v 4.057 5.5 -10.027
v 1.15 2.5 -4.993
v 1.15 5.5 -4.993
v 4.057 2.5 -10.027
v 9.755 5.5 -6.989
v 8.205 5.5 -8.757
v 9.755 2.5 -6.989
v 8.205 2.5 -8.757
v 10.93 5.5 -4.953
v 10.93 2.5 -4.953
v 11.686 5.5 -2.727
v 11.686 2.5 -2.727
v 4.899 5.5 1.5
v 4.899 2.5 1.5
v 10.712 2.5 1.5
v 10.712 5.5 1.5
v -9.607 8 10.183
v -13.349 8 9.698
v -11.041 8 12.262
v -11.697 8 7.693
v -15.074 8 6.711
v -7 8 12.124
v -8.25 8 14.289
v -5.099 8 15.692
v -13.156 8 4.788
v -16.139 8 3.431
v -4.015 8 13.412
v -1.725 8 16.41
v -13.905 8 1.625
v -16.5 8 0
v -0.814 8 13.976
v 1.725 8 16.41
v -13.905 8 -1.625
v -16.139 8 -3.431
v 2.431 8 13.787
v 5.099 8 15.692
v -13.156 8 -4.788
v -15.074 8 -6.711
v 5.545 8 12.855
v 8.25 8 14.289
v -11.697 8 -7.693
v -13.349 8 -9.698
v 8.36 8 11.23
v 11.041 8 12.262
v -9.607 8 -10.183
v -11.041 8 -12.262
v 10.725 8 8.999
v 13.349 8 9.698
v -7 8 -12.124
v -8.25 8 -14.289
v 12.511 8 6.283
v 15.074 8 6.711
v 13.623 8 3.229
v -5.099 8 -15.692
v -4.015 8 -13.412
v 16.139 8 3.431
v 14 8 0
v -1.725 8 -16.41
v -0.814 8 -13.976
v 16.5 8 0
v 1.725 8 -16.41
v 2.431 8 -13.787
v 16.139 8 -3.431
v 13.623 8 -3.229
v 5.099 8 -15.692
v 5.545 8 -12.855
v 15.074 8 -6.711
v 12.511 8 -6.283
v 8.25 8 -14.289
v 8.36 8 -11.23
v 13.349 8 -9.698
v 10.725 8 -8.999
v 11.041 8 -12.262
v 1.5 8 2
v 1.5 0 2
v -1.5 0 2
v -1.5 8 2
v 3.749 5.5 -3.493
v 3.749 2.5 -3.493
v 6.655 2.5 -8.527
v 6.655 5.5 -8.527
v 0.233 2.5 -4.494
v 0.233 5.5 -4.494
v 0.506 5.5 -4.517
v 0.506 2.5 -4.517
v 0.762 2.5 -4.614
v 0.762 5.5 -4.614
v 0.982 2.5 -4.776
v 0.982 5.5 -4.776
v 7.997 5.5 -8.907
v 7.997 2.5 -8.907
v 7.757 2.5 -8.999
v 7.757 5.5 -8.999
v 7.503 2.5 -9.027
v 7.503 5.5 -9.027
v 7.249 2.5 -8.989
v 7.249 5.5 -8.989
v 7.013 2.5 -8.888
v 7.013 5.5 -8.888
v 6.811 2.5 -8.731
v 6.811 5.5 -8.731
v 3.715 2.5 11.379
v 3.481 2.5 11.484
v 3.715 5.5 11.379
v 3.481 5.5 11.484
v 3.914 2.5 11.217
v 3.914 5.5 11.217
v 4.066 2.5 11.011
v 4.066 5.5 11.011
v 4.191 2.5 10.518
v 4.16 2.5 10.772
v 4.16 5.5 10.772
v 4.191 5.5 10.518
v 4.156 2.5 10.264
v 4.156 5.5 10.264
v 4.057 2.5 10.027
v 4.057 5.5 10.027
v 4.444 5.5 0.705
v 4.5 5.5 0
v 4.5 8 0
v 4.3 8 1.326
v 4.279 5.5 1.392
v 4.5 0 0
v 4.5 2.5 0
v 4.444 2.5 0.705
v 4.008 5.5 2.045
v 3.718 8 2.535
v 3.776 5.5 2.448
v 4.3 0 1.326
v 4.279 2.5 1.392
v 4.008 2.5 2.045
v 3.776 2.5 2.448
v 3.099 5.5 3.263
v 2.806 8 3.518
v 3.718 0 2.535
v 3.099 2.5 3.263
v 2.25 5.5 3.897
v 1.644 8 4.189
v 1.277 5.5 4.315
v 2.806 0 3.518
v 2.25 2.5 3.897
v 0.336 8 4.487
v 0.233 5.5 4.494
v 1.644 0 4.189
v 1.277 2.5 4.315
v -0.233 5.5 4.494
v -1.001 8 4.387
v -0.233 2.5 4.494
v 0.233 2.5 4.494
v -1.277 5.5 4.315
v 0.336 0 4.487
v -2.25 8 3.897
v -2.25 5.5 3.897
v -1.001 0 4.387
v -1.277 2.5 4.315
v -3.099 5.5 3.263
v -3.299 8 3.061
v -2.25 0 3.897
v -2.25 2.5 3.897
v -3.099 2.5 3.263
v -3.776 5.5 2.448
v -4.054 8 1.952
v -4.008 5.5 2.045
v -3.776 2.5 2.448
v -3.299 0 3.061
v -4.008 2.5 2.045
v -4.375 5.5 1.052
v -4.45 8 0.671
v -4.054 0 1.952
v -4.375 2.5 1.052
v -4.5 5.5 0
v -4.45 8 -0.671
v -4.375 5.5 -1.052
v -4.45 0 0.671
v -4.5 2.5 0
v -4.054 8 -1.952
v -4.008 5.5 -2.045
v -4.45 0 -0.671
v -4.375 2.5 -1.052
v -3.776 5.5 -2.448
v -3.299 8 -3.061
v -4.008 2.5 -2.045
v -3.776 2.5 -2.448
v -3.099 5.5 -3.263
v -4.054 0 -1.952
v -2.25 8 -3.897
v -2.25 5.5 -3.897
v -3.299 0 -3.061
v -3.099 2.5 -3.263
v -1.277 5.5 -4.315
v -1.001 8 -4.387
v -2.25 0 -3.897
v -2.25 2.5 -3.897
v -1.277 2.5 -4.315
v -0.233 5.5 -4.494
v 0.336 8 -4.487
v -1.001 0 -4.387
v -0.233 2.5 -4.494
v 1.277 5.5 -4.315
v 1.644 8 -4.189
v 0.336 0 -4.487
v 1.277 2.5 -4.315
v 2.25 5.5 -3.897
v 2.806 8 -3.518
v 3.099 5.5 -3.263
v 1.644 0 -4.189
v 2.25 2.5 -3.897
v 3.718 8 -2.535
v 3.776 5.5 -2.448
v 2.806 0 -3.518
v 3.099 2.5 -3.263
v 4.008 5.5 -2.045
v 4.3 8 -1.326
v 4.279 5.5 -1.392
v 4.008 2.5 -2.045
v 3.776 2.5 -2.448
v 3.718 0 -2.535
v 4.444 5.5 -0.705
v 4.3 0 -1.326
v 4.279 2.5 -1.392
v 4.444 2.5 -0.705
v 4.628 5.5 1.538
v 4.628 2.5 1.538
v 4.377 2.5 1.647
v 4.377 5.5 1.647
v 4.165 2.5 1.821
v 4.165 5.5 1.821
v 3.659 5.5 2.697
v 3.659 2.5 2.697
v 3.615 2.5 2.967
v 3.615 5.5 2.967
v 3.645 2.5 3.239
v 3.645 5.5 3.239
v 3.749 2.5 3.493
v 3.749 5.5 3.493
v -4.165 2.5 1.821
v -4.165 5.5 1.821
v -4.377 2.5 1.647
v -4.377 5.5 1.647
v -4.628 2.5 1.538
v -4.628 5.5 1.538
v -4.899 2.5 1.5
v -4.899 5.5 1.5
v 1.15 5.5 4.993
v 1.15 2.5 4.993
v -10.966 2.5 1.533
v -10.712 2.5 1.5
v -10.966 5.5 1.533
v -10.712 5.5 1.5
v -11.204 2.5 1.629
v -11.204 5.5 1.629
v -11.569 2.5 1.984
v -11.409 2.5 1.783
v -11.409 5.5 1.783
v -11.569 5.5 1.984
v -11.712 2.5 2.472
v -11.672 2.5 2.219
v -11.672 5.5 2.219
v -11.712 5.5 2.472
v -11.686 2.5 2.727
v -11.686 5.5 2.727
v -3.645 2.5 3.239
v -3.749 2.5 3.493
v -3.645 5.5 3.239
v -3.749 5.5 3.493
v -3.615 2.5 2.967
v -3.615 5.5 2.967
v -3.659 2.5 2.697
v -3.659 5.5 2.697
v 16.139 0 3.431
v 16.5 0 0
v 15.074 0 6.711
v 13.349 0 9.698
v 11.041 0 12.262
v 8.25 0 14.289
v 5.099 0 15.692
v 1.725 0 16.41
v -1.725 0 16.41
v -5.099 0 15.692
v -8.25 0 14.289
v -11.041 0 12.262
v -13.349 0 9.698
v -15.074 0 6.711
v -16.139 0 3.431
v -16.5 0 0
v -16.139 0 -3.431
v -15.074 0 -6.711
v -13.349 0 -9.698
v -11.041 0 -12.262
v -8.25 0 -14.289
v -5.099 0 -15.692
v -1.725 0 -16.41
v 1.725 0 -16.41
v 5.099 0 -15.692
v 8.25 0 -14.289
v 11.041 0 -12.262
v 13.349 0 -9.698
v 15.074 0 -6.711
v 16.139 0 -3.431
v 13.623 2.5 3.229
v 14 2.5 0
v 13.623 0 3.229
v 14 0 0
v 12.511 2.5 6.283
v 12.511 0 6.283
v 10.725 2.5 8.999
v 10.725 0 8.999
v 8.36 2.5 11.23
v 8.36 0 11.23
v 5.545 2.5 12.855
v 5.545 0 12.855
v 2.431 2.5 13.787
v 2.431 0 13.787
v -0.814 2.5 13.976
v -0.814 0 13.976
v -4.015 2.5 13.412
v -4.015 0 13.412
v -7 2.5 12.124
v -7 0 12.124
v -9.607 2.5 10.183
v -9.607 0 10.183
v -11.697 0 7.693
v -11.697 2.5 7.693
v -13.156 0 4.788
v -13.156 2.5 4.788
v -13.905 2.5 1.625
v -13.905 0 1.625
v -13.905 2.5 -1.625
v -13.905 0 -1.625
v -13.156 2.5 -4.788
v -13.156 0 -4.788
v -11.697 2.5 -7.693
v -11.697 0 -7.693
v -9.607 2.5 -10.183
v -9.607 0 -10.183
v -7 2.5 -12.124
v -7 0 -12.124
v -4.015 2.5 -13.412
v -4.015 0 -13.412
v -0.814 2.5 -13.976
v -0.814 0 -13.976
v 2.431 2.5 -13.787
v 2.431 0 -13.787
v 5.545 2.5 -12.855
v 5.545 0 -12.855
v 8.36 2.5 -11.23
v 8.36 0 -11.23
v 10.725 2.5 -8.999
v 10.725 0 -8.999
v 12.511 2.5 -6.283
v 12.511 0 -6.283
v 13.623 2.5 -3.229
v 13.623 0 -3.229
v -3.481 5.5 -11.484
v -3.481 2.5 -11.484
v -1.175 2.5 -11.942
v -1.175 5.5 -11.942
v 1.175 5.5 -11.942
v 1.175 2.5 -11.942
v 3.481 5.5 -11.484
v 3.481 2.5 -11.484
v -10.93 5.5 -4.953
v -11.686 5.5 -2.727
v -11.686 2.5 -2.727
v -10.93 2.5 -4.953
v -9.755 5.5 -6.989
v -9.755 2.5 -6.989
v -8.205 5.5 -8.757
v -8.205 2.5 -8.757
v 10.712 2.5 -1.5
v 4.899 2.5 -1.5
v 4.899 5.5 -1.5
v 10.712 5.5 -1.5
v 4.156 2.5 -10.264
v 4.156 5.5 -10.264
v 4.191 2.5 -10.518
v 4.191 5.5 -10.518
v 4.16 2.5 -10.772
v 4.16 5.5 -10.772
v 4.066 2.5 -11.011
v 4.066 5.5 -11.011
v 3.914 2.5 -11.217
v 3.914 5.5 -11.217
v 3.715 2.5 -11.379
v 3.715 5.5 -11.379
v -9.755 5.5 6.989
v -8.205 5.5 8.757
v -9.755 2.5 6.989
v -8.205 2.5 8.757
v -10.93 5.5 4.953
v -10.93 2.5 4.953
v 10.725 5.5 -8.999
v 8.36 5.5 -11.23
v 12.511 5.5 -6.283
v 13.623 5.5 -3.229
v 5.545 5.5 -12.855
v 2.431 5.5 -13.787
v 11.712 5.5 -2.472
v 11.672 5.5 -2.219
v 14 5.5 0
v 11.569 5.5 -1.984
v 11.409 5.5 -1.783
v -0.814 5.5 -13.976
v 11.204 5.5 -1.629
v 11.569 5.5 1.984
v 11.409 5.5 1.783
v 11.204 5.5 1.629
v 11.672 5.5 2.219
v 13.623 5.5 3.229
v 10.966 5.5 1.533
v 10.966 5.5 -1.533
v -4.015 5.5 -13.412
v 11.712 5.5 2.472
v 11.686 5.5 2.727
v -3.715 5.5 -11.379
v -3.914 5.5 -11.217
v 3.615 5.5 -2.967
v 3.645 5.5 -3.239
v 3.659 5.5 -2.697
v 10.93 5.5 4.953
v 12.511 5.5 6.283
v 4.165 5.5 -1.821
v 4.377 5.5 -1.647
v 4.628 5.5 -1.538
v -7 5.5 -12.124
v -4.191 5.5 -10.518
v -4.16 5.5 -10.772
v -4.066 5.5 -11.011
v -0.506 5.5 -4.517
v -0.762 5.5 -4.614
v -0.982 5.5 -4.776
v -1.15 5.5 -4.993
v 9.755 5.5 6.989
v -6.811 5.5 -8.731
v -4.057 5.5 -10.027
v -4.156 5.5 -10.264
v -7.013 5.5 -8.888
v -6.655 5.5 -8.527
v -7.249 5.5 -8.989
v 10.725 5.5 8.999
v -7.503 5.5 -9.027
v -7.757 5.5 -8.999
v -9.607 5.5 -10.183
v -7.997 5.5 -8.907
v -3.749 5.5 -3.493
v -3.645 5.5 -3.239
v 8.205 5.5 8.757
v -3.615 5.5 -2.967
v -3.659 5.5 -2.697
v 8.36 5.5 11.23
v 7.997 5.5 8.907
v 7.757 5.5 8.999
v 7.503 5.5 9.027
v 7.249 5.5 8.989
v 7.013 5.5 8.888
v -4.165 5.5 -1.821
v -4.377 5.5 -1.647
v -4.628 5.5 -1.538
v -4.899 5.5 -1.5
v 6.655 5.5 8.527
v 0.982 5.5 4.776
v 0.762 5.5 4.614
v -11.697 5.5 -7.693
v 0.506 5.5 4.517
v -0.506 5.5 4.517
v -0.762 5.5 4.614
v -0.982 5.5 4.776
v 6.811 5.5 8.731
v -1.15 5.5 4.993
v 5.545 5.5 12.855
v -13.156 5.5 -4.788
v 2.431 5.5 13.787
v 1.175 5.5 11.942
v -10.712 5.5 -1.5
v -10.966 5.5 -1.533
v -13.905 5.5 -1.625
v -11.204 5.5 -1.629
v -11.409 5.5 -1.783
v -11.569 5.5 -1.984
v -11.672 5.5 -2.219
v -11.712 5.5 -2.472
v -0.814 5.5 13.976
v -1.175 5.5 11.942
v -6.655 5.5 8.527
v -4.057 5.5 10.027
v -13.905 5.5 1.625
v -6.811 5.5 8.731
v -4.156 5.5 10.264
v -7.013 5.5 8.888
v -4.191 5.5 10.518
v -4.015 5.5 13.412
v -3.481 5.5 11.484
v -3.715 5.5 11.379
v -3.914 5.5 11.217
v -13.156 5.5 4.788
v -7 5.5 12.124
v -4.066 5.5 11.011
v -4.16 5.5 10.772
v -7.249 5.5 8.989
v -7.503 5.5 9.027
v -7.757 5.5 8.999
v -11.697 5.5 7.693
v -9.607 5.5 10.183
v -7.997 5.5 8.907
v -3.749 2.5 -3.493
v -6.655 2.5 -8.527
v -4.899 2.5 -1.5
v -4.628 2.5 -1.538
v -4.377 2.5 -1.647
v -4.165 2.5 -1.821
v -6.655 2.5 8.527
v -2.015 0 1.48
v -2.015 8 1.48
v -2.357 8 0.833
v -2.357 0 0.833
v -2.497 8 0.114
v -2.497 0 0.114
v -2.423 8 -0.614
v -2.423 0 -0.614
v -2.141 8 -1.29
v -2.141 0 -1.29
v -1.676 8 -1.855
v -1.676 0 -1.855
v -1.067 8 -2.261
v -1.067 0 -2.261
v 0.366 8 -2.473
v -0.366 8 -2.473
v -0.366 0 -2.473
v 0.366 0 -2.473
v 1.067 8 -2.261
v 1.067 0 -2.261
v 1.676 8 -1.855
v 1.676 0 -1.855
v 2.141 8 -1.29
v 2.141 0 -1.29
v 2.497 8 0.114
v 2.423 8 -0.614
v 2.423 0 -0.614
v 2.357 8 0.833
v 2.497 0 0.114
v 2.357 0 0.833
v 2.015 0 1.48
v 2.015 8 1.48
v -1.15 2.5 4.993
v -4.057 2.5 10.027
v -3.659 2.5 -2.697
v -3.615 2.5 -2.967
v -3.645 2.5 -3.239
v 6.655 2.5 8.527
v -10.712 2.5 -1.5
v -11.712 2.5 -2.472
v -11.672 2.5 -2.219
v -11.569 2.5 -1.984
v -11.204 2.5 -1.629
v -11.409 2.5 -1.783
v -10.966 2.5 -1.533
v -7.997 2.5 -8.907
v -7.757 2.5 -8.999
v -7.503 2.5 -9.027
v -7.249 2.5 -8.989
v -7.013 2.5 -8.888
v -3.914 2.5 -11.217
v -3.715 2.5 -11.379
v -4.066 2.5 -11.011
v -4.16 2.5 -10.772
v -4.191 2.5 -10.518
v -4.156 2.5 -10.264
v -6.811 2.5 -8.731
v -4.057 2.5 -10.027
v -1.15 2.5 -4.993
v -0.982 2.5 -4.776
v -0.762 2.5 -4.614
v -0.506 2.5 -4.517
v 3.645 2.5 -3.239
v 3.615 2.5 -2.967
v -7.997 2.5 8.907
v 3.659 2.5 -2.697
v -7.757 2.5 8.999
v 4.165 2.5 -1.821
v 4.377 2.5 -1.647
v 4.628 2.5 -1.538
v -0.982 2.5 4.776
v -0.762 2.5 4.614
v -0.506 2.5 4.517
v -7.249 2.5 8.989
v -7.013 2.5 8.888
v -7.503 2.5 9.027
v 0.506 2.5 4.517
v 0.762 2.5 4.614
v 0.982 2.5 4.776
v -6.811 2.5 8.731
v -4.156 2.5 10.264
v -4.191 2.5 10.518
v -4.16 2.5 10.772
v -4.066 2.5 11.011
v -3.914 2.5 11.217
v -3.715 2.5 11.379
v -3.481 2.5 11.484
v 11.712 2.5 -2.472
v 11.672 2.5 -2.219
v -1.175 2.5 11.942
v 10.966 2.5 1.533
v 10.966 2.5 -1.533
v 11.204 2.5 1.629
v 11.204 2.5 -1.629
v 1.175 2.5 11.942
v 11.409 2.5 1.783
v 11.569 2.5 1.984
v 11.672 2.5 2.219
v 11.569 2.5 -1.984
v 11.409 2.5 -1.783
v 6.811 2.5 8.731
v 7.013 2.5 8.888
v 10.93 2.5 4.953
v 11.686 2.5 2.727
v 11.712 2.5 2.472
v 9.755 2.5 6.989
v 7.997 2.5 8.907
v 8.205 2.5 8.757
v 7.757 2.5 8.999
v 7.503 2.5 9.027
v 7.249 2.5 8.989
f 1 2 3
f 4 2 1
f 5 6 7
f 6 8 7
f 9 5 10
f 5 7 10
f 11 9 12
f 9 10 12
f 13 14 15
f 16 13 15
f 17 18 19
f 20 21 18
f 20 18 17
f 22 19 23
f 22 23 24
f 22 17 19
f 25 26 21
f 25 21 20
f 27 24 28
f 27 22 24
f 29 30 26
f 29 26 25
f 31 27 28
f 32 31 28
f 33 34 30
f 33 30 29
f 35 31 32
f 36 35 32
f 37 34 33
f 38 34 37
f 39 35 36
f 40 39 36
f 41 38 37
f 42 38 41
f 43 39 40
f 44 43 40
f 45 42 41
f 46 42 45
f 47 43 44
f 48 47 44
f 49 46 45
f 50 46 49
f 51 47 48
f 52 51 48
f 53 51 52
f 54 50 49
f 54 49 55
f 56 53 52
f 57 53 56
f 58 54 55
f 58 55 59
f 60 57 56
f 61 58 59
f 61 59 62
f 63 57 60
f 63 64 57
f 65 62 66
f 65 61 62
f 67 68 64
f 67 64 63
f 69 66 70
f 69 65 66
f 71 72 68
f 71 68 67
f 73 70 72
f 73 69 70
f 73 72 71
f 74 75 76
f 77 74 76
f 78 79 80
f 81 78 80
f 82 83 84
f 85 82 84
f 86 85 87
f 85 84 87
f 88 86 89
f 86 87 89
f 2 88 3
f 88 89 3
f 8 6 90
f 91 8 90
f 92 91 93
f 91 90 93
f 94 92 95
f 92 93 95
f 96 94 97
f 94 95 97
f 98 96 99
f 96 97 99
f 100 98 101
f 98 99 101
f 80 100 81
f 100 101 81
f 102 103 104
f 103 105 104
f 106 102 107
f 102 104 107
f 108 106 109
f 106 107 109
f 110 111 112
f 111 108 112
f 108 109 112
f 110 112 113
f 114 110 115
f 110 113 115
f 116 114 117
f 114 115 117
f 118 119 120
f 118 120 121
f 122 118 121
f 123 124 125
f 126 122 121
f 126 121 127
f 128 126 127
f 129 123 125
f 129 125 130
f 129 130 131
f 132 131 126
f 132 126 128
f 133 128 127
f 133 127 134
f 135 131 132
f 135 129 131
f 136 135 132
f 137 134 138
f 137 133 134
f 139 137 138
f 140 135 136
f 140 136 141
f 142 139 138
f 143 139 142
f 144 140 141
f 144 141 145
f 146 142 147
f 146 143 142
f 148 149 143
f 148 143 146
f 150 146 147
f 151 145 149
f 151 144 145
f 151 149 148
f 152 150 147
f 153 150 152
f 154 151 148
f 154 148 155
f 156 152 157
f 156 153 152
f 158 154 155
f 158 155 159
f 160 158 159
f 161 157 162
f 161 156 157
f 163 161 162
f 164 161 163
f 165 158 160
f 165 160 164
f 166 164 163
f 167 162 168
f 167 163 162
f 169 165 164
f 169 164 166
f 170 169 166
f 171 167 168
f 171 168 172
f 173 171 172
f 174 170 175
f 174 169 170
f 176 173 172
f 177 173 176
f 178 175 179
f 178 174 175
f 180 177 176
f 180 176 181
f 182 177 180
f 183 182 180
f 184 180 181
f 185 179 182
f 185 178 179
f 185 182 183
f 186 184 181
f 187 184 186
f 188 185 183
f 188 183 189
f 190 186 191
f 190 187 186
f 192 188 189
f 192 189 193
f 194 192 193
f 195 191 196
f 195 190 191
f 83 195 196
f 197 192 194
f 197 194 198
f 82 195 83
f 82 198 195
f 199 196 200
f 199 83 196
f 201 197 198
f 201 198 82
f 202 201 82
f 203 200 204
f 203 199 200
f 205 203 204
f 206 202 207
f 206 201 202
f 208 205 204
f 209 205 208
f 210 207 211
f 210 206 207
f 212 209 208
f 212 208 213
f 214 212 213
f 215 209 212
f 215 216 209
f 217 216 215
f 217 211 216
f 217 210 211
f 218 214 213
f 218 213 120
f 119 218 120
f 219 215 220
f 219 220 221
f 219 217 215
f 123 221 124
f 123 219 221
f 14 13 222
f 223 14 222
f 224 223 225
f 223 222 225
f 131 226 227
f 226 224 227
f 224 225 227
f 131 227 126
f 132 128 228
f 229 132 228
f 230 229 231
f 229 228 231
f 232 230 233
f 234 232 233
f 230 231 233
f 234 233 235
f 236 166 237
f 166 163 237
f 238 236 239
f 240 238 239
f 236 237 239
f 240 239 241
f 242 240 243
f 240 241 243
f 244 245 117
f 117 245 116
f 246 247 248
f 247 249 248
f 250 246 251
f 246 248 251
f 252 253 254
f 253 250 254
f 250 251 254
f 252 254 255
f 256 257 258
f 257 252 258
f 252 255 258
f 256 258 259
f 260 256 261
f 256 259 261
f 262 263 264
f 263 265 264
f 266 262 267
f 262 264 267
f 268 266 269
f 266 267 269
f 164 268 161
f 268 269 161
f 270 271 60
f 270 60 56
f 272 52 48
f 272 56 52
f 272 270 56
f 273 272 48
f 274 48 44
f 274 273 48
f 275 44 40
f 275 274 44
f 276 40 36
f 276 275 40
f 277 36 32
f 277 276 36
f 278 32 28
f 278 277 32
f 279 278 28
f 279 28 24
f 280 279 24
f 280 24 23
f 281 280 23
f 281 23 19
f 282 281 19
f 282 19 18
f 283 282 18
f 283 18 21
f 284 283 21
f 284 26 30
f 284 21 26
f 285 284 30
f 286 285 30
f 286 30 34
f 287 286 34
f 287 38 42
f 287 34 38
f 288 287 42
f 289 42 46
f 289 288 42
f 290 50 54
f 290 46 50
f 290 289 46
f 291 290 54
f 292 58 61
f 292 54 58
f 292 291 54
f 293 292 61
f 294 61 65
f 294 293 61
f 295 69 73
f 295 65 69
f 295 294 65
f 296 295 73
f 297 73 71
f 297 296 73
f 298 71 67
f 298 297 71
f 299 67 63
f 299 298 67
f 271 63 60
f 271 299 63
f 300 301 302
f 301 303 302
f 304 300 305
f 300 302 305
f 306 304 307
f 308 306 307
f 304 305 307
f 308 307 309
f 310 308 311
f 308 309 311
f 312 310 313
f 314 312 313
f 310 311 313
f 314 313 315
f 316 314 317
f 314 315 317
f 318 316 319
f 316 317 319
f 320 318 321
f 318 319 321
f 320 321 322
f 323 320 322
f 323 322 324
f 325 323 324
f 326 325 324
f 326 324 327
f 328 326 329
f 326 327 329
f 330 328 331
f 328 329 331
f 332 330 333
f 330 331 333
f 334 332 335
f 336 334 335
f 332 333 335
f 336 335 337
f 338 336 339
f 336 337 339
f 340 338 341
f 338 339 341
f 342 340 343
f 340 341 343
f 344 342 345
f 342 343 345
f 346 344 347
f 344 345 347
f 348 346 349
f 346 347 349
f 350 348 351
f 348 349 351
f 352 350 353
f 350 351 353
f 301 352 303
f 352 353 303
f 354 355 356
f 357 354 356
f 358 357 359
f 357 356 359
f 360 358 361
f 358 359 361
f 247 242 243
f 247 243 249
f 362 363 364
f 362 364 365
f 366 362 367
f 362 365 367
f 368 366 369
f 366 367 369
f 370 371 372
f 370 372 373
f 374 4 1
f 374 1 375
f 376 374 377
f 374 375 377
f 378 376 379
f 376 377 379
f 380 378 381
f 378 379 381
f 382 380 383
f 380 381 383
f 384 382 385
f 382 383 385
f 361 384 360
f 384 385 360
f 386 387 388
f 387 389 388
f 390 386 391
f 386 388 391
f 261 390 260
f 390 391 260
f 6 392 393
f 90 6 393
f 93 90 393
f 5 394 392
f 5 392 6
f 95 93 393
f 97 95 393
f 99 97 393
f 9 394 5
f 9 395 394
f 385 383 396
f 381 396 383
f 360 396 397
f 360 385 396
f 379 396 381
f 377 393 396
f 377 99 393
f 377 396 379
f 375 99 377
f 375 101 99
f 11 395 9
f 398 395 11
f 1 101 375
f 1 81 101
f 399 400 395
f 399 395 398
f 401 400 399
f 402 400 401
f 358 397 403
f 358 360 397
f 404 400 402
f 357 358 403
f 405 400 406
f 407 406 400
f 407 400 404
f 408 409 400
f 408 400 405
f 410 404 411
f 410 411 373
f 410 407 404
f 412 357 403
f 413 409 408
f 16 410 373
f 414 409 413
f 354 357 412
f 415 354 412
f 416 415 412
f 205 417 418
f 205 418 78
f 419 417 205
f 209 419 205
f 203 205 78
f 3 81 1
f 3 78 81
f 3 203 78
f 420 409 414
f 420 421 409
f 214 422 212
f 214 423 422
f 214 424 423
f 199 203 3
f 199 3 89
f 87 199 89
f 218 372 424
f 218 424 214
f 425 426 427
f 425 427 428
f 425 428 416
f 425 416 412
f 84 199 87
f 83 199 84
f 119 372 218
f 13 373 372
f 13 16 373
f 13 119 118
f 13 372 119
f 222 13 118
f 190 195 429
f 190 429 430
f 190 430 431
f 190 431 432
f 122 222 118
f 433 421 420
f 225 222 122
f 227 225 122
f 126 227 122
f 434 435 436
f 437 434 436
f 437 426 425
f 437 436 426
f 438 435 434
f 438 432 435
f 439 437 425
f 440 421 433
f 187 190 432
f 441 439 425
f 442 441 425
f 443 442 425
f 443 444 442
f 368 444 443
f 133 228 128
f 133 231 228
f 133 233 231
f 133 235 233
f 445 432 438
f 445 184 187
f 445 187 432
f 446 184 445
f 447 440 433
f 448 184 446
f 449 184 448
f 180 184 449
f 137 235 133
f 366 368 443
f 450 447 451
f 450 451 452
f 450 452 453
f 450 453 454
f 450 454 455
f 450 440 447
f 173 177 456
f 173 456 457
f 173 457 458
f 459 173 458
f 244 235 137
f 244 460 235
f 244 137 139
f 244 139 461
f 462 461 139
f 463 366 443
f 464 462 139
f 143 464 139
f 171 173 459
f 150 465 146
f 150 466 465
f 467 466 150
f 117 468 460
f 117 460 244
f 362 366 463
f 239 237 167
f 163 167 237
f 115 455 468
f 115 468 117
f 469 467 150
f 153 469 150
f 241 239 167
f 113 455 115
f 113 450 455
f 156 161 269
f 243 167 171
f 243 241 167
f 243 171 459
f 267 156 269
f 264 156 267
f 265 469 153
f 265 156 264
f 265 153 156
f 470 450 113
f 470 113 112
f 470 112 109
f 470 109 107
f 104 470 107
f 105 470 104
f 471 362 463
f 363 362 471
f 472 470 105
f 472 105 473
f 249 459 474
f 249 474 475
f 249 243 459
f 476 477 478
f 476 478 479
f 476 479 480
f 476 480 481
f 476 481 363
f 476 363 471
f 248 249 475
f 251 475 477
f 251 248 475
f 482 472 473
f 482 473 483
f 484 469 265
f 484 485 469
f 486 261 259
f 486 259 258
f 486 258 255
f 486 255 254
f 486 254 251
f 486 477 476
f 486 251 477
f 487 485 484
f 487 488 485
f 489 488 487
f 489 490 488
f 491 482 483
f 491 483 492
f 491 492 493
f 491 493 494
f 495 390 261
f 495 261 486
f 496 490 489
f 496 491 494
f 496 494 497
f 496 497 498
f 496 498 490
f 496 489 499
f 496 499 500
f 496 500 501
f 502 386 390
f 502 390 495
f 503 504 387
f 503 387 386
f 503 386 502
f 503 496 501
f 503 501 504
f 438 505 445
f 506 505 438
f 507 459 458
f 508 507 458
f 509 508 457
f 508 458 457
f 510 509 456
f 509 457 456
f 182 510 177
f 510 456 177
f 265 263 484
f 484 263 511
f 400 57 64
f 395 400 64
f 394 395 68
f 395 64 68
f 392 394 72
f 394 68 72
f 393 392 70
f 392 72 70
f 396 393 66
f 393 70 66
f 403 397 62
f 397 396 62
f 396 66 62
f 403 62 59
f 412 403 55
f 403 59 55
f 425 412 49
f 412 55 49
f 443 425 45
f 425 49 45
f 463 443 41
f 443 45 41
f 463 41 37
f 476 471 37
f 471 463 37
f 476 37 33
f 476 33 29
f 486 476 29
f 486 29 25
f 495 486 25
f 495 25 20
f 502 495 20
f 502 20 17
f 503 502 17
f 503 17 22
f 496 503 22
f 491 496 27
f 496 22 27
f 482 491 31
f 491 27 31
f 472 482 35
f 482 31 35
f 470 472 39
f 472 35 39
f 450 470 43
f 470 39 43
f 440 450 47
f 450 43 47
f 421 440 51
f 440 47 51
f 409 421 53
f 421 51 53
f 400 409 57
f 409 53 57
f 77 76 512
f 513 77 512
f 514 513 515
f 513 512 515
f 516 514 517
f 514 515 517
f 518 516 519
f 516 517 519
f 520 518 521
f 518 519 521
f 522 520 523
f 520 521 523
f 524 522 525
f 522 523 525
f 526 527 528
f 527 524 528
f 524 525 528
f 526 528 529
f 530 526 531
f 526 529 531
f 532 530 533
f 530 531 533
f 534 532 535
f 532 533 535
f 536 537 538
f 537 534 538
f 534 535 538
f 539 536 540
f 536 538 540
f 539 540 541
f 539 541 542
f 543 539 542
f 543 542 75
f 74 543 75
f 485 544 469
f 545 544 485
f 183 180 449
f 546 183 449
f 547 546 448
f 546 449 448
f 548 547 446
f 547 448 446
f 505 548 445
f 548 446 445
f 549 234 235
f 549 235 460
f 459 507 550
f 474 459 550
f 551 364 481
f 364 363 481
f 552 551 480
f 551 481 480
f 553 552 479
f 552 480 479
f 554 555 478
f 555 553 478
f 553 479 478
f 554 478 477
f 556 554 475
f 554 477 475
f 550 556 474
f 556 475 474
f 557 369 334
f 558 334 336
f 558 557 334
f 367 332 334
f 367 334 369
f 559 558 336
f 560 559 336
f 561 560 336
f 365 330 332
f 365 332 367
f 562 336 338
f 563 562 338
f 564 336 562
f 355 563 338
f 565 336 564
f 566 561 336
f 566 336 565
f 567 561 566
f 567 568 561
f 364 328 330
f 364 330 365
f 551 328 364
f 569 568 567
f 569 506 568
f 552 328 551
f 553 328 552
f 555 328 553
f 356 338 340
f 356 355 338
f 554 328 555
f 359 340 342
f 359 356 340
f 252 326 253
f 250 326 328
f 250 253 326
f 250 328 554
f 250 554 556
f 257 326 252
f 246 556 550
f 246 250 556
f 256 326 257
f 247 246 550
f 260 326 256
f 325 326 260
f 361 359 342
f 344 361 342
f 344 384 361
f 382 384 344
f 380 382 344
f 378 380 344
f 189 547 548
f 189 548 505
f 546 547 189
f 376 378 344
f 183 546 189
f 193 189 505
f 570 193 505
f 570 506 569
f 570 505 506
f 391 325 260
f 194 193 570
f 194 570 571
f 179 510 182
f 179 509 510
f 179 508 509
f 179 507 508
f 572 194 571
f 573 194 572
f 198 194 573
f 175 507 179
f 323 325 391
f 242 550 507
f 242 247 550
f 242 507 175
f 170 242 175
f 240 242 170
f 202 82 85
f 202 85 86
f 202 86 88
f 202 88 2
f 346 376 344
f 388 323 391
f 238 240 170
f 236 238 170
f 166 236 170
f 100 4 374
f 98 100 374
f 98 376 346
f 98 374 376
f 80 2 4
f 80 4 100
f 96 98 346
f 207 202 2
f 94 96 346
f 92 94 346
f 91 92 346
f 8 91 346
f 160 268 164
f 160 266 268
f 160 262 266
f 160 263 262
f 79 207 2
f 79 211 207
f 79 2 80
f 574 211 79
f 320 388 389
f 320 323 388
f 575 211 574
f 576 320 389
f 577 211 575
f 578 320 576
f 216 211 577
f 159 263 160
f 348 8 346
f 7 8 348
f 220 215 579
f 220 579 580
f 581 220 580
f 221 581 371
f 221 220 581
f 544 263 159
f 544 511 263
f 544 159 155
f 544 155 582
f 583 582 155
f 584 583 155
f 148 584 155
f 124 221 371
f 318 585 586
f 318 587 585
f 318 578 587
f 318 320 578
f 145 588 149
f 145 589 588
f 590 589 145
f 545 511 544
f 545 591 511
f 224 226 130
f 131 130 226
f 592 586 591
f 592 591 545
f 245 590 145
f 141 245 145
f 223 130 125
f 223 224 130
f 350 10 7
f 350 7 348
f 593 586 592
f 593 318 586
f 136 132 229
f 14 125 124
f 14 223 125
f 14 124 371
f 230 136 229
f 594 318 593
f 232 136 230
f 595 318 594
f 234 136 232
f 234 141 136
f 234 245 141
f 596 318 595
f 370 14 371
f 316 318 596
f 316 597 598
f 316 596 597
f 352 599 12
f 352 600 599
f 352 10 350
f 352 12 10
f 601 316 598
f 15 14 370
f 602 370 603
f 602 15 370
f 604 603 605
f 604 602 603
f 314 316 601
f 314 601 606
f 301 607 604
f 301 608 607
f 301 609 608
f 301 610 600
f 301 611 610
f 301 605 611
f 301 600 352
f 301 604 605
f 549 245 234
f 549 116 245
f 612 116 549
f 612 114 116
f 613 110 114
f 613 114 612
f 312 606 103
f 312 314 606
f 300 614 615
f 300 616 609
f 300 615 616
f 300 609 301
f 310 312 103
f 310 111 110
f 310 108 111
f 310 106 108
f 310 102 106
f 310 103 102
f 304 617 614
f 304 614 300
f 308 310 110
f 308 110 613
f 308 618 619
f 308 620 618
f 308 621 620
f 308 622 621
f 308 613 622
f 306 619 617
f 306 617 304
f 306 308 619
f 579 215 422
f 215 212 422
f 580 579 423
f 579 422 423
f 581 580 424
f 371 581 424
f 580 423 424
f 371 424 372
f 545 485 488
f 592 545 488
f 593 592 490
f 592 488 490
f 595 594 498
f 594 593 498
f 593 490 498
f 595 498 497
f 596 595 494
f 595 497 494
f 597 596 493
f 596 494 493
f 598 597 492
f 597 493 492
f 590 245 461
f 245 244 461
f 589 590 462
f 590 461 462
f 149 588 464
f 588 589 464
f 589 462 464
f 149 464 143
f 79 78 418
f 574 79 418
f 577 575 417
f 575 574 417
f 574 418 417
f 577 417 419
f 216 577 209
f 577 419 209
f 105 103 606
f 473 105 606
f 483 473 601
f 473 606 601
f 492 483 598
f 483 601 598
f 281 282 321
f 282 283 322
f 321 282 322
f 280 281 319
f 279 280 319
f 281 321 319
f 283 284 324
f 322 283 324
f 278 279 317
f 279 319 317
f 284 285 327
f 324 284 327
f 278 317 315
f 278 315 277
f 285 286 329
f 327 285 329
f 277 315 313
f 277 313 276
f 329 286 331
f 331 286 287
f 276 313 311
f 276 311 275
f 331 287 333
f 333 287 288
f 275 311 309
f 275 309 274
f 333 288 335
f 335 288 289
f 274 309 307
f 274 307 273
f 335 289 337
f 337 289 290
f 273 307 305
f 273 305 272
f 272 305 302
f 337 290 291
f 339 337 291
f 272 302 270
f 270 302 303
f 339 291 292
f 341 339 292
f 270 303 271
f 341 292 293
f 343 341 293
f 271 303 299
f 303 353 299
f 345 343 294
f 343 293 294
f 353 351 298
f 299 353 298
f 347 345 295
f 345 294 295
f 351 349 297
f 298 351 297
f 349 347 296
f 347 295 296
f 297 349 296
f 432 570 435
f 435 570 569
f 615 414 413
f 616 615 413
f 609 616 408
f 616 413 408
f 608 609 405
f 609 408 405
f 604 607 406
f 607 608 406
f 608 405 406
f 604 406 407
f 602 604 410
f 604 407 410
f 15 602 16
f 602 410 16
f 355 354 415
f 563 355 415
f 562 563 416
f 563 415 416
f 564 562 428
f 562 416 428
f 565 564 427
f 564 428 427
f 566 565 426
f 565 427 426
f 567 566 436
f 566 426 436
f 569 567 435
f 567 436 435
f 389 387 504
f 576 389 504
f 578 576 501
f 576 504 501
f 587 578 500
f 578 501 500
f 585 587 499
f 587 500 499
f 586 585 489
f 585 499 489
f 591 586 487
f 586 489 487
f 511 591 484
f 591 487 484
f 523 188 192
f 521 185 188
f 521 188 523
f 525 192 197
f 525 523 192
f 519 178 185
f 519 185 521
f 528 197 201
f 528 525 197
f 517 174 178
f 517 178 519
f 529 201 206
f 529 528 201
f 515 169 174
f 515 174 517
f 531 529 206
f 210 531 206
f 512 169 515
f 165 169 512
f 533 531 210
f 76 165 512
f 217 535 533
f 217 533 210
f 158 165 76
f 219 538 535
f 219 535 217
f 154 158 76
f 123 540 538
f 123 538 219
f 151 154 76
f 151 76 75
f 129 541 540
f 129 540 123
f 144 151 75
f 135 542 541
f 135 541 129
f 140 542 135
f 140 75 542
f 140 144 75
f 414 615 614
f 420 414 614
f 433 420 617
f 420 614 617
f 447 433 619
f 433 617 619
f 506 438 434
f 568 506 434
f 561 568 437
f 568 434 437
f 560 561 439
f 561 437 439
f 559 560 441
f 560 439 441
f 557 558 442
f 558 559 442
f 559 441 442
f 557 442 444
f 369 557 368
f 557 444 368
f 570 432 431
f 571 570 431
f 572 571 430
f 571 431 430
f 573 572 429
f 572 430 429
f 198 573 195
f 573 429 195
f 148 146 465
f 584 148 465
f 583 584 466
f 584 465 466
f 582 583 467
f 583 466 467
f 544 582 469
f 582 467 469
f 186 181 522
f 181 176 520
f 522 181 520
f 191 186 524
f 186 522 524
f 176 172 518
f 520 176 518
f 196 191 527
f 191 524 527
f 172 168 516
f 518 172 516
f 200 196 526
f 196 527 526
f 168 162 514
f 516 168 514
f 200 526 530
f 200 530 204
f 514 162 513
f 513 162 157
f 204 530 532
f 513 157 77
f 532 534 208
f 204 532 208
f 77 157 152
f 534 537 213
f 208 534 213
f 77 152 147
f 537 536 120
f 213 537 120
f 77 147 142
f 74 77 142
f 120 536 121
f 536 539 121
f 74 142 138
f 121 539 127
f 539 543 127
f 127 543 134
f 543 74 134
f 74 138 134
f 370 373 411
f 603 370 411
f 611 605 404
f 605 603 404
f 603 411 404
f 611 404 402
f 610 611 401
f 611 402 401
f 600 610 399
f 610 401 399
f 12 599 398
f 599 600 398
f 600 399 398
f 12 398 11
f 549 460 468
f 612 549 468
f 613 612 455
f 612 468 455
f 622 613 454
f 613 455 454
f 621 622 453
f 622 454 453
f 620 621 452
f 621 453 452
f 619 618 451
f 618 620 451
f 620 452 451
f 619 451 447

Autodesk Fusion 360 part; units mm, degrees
sketch "Sketch1" plane through (0, 0, 0) normal (0, 1, 0) x (1, 0, 0)
  circle A0 centre (0, 0) radius 16.5
  dimension "d1" = 33
extrude "Extrude1" add sketch "Sketch1" along normal blind 8
ref_plane "WorkPlane1" through (0, 4, 0) normal (0, -1, 0) x (-1, 0, 0)
sketch "Sketch2" plane through (0, 0, 0) normal (0, -1, 0) x (1, 0, 0)
  circle A0 centre (0, 0) radius 16.5
  circle A1 centre (0, 0) radius 14
  dimension "d4" = -2.5
extrude "Extrude2" cut sketch "Sketch2" against normal blind 2.5 contours A1
mirror "Mirror1" about plane through (0, 4, 0) normal (0, -1, 0) of "Extrude2"
hole "Hole3" at (0, 2.5, 0) direction (0, 1, 0) diameter 5 end through all
sketch "Sketch5" plane through (0, 2.5, 0) normal (0, -1, 0) x (1, 0, 0)
  circle A0 centre (0, 0) radius 2.5
  circle A1 centre (0, 0) radius 14
  circle A2 centre (0, 0) radius 4.5
  dimension "d22" = 2
extrude "Extrude4" add sketch "Sketch5" against normal up to surface (8 mm away) from surface at 2.5 contours A2
sketch "Sketch8" plane through (0, 2.5, 0) normal (0, -1, 0) x (1, 0, 0)
  circle A0 centre (0, 0) radius 4.5
  circle A1 centre (0, 0) radius 14
  circle A2 centre (0, 0) radius 12
  line L0 (-4.5, 0) -> (-12, 0)
  line L1 (-4.2426, 1.5) -> (-11.9059, 1.5)
  line L2 (-4.2426, -1.5) -> (-11.9059, -1.5)
  line L3 (-3.4204, -2.9242) -> (-7.252, -9.5608)
  line L4 (-0.8223, -4.4242) -> (-4.6539, -11.0608)
  line L5 (0.8223, -4.4242) -> (4.6539, -11.0608)
  line L6 (3.4204, -2.9242) -> (7.252, -9.5608)
  line L7 (4.2426, -1.5) -> (11.9059, -1.5)
  line L8 (4.2426, 1.5) -> (11.9059, 1.5)
  line L9 (3.4204, 2.9242) -> (7.252, 9.5608)
  line L10 (0.8223, 4.4242) -> (4.6539, 11.0608)
  line L11 (-0.8223, 4.4242) -> (-4.6539, 11.0608)
  line L12 (-3.4204, 2.9242) -> (-7.252, 9.5608)
  dimension "d30" = -2
  dimension "d31" = 1.5
  dimension "d33" = 360
extrude "Extrude6" cut sketch "Sketch8" against normal through all contours A0 A2 L8 L9 | A0 A2 L6 L7 | A0 A2 L10 L11 | A0 A2 L4 L5 | A0 A2 L1 L12 | A0 A2 L2 L3
fillet "Fillet1" radius 1 24 edges at (11.9059, 4, 1.5) (4.2426, 4, 1.5) (3.4204, 4, 2.9242) (7.252, 4, 9.5608) (4.6539, 4, 11.0608) (0.8223, 4, 4.4242) (-0.8223, 4, 4.4242) (-4.6539, 4, 11.0608) (4.2426, 4, -1.5) (3.4204, 4, -2.9242) (11.9059, 4, -1.5) (7.252, 4, -9.5608) (0.8223, 4, -4.4242) (-0.8223, 4, -4.4242) (-4.6539, 4, -11.0608) (4.6539, 4, -11.0608) (-7.252, 4, 9.5608) (-11.9059, 4, 1.5) (-3.4204, 4, 2.9242) (-4.2426, 4, 1.5) (-11.9059, 4, -1.5) (-7.252, 4, -9.5608) (-3.4204, 4, -2.9242) (-4.2426, 4, -1.5)
sketch "Sketch9" plane through (0, 0, 0) normal (0, -1, 0) x (1, 0, 0)
  circle A0 centre (0, 0) radius 2.5
  circle A1 centre (0, 0) radius 4.5
  line L0 (1.5, 2) -> (-1.5, 2)
  dimension "d37" = 2
extrude "Extrude7" add sketch "Sketch9" against normal up to surface (8 mm away) contours A0 L0 picked at (-0.3999, 2.0645)
